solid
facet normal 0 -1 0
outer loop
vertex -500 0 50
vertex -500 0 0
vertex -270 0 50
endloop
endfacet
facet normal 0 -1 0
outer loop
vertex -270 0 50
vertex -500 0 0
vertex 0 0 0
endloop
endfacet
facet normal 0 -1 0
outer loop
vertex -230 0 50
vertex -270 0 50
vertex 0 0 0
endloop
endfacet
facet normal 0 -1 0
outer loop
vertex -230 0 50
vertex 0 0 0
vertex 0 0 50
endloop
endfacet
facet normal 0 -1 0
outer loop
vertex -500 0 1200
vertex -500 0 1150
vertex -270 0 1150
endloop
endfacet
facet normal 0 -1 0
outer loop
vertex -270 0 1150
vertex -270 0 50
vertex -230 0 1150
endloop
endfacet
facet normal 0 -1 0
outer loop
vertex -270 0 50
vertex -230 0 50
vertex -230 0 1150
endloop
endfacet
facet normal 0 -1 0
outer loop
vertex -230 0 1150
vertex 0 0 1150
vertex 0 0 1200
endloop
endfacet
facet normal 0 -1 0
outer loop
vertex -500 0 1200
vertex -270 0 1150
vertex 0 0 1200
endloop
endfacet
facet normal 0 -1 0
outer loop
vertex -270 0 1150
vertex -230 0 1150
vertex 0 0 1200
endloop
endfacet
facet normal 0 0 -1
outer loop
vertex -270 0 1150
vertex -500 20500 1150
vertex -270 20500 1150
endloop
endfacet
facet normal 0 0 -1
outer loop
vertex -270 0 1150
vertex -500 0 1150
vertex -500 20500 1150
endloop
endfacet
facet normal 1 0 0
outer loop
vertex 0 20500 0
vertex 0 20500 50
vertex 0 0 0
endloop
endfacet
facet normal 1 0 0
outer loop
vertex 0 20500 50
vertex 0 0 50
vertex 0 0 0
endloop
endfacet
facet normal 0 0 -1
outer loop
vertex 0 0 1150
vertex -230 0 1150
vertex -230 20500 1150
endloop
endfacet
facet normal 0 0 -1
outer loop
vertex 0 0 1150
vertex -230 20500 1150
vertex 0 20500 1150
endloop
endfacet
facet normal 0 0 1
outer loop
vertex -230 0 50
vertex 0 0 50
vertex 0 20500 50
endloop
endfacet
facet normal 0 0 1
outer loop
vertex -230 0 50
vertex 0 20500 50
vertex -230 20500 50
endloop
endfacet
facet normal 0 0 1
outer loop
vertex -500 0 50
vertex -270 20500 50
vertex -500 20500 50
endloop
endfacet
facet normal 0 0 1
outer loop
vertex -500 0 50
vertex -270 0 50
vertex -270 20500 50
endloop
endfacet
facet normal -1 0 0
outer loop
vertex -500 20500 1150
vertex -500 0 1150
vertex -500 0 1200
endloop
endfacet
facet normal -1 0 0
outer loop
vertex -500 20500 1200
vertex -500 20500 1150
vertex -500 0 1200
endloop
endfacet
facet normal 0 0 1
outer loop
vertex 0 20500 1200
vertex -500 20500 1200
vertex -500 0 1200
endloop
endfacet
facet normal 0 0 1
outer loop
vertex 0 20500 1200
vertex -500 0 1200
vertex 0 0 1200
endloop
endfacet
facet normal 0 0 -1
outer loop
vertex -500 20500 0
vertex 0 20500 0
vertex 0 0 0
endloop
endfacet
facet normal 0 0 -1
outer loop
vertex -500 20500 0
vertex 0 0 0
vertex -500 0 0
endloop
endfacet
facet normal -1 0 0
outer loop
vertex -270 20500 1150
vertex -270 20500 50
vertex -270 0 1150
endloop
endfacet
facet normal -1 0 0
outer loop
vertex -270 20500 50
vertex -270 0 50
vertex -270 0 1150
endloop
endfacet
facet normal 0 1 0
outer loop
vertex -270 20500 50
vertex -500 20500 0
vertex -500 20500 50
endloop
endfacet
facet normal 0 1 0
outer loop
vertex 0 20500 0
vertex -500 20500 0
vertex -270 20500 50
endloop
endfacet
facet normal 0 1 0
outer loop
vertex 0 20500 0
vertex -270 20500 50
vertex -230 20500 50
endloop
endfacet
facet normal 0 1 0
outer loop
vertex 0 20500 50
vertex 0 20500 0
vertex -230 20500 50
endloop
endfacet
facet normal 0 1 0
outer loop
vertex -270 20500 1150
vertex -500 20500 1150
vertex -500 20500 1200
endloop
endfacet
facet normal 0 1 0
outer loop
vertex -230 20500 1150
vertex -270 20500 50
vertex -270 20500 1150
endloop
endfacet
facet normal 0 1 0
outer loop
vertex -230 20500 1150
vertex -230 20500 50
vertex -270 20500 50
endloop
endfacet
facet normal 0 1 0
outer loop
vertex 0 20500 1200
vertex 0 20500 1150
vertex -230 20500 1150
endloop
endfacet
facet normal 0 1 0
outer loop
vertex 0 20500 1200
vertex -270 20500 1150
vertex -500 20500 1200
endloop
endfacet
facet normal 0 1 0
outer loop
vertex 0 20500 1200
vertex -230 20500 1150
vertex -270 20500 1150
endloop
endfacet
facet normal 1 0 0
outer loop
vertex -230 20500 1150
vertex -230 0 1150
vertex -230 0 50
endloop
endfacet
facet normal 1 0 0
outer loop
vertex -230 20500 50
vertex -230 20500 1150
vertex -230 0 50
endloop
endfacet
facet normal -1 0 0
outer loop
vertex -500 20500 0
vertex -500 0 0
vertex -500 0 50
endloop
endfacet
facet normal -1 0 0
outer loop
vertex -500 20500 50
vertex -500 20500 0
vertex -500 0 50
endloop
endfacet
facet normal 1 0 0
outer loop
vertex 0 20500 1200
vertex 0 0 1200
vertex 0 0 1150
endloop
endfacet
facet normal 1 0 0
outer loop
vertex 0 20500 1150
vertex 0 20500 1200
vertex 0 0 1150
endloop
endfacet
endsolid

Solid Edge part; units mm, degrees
sketch "Sketch1" plane through (0, 0, 0) normal (0, -1, 0) x (1, 0, 0)
  line L0 (-500, 1200) -> (0, 1200)
  line L1 (0, 1200) -> (0, 1150)
  line L2 (-230, 1150) -> (0, 1150)
  line L3 (-230, 1150) -> (-230, 50)
  line L4 (0, 50) -> (-230, 50)
  line L5 (0, 50) -> (0, 0)
  line L6 (0, 0) -> (-500, 0)
  line L7 (-500, 0) -> (-500, 50)
  line L8 (-270, 50) -> (-500, 50)
  line L9 (-270, 50) -> (-270, 1150)
  line L10 (-500, 1150) -> (-270, 1150)
  line L11 (-500, 1150) -> (-500, 1200)
extrude "Protrusion1" add sketch "Sketch1" against normal blind 20500
properties material "Aluminum, 6061-T6"
